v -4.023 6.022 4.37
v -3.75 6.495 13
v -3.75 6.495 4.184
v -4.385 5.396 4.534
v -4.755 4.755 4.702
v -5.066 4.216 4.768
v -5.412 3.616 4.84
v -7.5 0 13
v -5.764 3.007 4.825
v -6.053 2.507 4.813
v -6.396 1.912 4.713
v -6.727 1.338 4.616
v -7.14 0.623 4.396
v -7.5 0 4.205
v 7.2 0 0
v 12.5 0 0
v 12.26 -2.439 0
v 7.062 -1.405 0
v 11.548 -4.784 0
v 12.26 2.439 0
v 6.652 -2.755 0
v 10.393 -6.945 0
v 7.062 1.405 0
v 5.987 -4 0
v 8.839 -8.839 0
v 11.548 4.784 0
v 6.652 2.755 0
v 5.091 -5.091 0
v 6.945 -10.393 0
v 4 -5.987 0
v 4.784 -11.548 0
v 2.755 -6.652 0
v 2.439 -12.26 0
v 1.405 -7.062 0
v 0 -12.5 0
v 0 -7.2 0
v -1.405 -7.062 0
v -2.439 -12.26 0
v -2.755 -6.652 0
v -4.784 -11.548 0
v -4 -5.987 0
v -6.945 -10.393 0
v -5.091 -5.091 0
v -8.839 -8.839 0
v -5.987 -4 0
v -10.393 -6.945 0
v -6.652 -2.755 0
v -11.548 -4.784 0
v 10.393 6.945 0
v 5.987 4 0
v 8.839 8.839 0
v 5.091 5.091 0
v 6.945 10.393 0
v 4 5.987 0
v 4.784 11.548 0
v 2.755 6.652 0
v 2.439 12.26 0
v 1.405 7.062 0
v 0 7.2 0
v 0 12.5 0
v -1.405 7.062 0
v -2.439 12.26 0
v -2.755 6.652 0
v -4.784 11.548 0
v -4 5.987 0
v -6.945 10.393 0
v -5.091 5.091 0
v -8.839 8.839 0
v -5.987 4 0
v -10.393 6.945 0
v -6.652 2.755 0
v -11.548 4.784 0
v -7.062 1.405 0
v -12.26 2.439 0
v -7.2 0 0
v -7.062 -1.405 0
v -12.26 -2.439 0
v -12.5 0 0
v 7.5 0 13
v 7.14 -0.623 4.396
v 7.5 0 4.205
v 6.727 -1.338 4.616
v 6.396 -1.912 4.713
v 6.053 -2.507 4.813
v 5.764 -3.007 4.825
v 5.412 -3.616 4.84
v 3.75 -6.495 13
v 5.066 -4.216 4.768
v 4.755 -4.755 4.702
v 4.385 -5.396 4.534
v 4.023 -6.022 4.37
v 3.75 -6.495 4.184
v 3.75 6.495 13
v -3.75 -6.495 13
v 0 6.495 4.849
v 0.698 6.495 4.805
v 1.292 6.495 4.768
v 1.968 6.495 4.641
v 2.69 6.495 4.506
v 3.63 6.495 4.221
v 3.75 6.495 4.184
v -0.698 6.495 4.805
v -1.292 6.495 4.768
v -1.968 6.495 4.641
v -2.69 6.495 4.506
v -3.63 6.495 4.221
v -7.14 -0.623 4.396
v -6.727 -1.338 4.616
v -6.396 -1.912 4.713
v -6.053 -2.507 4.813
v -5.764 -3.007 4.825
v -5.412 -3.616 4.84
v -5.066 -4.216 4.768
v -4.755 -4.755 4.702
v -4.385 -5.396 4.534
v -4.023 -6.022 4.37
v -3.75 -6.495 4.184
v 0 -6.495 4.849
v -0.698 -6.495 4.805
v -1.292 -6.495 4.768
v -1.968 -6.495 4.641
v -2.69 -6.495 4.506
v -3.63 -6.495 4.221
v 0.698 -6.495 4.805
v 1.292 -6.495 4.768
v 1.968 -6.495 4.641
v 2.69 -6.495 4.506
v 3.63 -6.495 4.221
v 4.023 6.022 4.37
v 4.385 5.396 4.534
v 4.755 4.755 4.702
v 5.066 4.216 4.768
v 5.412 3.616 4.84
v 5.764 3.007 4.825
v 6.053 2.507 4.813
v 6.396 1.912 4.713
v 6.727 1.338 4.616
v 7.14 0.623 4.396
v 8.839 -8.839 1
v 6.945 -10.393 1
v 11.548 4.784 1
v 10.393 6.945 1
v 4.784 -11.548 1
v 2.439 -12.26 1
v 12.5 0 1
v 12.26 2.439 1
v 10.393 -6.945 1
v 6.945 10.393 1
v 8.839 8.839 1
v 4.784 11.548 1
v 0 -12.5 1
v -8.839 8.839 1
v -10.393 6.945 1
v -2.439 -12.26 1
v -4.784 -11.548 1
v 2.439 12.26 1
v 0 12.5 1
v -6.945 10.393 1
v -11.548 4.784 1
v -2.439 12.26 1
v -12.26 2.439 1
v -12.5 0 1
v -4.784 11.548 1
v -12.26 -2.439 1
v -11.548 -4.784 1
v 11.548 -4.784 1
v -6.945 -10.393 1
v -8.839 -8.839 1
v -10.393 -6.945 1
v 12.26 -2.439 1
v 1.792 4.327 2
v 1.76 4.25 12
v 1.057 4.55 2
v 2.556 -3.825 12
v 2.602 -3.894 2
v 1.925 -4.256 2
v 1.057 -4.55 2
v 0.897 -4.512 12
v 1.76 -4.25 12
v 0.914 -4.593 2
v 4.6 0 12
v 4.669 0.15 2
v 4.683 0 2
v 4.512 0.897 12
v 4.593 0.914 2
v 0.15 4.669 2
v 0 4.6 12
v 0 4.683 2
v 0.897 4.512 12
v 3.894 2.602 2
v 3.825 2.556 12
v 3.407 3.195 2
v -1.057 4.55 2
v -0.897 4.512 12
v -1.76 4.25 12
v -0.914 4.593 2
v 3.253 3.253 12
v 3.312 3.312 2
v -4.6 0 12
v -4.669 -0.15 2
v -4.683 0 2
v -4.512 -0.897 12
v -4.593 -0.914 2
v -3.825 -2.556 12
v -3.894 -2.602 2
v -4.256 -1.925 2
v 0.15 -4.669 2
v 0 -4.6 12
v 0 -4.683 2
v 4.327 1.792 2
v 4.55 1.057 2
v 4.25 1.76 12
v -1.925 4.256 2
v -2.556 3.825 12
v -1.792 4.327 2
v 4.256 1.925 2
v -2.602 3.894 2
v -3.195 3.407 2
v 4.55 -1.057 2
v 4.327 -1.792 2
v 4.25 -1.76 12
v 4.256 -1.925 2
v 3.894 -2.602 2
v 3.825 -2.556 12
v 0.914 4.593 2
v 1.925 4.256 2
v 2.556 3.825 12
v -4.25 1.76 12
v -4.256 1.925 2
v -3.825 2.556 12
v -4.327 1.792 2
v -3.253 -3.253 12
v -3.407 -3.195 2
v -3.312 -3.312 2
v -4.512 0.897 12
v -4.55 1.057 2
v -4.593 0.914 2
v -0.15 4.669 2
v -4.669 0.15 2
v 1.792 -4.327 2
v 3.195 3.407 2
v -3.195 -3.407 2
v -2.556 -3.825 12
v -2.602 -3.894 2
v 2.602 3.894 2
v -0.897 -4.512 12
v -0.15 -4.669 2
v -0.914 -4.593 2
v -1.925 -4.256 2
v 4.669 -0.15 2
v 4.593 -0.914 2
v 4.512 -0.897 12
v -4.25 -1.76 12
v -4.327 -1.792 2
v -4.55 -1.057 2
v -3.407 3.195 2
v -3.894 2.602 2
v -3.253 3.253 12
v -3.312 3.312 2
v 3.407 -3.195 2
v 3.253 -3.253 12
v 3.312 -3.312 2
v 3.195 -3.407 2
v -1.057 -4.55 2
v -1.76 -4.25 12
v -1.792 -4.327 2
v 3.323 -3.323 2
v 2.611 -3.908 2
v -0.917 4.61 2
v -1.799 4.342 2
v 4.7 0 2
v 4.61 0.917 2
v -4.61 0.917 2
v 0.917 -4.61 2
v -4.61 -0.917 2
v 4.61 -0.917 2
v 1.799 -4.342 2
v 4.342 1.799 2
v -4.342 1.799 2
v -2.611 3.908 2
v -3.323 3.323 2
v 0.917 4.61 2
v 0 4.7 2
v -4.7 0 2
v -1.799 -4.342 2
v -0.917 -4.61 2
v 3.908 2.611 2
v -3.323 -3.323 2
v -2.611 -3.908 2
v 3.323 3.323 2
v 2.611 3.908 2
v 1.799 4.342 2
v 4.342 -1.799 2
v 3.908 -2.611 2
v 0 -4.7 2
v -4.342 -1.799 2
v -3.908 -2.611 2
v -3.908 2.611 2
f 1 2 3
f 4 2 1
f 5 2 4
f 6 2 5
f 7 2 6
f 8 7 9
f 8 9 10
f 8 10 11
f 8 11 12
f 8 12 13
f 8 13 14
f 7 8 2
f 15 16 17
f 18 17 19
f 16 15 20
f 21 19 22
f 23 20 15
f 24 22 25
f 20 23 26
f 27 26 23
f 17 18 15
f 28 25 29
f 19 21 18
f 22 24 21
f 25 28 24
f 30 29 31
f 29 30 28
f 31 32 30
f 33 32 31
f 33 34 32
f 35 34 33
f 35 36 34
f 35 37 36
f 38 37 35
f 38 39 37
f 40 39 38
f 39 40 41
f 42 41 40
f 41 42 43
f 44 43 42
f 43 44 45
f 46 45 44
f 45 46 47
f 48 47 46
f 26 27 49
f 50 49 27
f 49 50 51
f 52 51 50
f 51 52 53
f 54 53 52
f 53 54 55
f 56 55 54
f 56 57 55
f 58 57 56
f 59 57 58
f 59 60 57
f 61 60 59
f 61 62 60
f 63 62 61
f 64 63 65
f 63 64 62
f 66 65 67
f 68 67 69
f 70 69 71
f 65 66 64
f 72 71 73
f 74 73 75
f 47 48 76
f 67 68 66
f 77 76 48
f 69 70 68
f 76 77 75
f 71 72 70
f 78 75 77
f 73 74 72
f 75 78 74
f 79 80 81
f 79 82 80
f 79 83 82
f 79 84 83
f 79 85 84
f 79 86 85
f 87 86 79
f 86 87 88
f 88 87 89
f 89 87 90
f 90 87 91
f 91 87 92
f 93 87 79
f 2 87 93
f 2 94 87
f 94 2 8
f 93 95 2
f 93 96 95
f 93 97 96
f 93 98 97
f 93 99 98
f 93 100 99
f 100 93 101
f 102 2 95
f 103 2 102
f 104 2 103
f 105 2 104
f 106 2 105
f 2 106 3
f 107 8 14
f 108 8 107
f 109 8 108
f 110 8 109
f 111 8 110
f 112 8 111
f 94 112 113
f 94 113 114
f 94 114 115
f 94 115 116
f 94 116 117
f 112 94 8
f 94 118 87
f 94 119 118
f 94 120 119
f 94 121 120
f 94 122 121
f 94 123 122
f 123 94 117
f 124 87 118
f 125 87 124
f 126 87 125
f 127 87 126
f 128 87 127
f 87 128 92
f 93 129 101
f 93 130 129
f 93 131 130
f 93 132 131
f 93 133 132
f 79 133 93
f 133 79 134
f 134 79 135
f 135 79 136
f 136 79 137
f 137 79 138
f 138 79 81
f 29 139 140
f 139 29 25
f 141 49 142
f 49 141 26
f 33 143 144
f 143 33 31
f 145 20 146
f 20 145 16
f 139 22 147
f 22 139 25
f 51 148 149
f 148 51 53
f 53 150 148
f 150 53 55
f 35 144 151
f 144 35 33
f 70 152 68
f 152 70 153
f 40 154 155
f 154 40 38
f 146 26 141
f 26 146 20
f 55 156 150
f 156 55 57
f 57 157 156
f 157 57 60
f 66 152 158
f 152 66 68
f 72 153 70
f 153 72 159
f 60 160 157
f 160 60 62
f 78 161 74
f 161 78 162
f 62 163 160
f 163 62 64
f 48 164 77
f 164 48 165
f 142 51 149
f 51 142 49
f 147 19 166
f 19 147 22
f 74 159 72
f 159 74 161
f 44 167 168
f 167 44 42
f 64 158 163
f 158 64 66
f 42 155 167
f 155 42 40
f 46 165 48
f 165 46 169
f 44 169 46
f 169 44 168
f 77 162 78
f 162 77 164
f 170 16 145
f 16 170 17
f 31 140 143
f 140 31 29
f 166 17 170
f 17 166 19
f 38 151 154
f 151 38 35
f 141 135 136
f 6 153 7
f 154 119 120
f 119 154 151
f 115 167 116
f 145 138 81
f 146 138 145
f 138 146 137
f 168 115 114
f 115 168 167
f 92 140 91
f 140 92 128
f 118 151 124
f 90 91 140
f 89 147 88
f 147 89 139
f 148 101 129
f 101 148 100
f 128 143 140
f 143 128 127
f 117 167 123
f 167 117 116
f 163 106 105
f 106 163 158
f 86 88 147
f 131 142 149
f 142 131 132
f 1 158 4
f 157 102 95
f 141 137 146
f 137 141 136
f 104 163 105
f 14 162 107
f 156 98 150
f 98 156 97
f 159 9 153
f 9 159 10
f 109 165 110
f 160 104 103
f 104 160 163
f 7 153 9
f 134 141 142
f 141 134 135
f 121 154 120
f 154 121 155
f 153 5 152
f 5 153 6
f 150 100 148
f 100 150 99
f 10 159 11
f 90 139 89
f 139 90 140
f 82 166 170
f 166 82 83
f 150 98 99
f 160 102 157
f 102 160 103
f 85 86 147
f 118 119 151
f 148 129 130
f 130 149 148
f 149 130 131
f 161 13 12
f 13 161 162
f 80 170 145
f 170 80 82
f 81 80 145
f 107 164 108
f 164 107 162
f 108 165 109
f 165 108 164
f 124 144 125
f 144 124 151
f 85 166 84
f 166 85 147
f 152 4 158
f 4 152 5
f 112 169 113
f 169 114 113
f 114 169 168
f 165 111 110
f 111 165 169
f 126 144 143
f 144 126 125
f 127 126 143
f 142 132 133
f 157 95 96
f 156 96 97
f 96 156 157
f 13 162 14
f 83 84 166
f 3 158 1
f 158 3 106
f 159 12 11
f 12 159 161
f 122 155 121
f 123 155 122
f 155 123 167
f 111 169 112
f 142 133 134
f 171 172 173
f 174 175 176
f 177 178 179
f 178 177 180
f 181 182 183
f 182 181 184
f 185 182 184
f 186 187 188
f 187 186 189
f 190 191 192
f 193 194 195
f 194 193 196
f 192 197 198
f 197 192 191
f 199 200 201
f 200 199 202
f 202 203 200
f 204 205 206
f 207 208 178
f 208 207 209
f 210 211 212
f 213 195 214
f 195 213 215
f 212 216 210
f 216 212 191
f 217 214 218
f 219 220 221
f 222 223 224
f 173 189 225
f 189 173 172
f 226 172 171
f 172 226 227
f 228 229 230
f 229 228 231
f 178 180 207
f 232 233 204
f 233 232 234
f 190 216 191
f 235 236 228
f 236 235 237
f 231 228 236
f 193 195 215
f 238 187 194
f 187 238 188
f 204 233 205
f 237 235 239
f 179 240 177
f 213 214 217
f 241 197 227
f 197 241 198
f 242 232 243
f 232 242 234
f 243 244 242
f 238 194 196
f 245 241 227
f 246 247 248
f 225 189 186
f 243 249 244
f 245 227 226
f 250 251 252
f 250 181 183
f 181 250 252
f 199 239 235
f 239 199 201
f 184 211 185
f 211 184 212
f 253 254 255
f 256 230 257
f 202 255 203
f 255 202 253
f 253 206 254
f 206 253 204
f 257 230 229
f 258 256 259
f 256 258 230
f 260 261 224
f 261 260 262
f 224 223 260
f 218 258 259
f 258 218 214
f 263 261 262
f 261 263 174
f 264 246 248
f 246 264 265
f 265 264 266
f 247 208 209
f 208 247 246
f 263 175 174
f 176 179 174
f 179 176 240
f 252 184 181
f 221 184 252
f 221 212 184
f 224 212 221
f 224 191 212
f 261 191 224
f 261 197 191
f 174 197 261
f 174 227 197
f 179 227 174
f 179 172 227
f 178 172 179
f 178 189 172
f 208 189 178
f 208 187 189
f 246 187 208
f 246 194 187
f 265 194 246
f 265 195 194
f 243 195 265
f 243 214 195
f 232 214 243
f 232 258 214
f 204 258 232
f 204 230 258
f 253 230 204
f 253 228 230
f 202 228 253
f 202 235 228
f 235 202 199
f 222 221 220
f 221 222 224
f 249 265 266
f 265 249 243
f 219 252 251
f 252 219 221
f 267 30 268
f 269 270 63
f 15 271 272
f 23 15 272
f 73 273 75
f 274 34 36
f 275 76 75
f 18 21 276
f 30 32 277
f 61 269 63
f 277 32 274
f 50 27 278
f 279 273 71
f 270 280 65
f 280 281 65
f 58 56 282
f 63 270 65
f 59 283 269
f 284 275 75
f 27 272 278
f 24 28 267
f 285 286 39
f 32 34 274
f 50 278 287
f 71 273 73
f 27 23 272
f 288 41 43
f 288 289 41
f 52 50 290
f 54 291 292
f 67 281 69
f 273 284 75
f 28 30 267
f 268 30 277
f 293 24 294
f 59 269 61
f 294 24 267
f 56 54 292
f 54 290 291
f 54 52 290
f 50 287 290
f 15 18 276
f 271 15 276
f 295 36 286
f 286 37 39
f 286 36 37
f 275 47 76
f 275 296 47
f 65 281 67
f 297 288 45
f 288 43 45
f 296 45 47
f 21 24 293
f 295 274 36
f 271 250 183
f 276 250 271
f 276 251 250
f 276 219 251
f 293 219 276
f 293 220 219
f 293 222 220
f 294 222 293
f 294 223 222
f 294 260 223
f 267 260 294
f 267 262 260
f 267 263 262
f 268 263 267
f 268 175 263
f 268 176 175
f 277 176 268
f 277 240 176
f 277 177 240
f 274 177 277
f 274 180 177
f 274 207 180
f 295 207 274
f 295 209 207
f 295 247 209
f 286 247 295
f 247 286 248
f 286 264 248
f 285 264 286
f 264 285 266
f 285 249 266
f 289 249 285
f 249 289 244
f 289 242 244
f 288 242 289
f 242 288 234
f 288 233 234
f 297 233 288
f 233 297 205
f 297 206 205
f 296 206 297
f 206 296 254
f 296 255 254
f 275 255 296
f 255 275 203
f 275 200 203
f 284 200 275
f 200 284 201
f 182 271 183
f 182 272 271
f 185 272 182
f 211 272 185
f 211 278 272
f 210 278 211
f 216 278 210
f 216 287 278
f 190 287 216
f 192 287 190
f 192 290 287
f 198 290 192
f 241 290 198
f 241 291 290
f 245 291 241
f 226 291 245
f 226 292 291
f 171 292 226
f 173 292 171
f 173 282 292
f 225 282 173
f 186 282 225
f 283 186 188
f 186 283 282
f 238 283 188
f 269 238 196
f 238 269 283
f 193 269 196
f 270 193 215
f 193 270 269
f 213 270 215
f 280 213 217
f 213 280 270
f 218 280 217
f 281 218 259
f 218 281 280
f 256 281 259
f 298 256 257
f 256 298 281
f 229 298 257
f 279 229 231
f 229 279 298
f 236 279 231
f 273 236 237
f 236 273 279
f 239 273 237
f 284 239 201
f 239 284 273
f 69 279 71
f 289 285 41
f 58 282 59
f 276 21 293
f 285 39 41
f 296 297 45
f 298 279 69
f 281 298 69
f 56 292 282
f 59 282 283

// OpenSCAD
// Coax Nut/Washer cover
// For holding the shelf against the wall without extra bolts/screws

$fn = 32;

coax_dia = 9.4;
coax_h = 12.0;
washer_dia = 25.0;
nut_dia = 15.0;
nut_h = coax_h+1.0;
washer_h = 1.0;

difference() {
    union() {
        linear_extrude(nut_h)
        circle(d=nut_dia, $fn=6);
        cylinder(h=washer_h, d=washer_dia);
        translate([0,0,washer_h])
        cylinder(h=5, d1=washer_dia, d2=coax_dia);
    }
    cylinder(d1=coax_dia, d2=coax_dia-0.2, h=coax_h);
    cylinder(d1=coax_dia+5, d2=coax_dia, h=2);
}
